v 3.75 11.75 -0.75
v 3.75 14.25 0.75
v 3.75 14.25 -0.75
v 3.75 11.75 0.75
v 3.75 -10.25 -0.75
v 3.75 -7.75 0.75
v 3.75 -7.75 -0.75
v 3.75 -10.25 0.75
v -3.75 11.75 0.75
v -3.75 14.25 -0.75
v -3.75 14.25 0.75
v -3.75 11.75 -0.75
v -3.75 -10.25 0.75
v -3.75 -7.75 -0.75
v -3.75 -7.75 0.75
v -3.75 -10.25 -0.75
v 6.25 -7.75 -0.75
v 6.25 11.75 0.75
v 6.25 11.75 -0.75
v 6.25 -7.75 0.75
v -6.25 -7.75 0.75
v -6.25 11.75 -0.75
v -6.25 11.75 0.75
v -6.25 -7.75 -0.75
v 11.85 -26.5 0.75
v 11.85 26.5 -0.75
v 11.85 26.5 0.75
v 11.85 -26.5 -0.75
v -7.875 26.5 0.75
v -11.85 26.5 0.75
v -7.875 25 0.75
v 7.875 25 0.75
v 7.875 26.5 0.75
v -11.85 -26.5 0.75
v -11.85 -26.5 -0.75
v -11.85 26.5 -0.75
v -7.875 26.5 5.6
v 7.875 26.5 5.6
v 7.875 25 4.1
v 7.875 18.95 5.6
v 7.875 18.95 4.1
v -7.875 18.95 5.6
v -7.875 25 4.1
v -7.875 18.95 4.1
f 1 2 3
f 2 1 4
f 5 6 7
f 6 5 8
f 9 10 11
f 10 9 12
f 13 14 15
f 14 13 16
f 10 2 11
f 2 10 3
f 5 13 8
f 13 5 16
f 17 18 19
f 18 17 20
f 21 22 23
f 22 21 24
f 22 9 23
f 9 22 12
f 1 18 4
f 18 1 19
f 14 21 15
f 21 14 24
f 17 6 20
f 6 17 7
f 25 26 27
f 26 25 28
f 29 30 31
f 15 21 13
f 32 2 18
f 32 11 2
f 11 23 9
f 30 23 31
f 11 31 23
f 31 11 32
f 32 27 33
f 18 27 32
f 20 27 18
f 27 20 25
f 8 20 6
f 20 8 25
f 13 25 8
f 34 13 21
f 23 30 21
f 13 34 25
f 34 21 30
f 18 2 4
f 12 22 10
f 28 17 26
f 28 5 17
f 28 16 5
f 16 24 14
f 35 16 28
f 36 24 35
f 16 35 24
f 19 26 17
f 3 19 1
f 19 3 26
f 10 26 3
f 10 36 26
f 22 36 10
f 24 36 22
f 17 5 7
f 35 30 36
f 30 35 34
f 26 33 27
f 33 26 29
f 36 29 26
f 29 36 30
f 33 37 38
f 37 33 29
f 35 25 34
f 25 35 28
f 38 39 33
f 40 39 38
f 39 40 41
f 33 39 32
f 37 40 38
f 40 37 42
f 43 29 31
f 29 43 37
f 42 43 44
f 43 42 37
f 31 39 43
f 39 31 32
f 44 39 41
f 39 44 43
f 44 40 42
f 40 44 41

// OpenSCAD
// pc6001 rear shell for power entry connector
// about 5.5mm on either side of the qualitek entry

THICKNESS = 1.5; // 1.2 measured, just being safe
FUDGE = 0.5;

module iec_cutout () {
    // Qualitek 770W-X2/13 snap-in
    union() {
        // 24.5 x 7.5 inner cutout
        cube([7.5, 24.5, THICKNESS * 2], center=true);
        // 19.5 x 12.5 outer cutout
        cube([12.5, 19.5, THICKNESS * 2], center=true);
    }
}

module back_plate () {
    // The main vertical plate
    cube([23.7, 53, THICKNESS], center=true);
}

module mounting_lip() {
    union() {
        // The upright that connects it to the lip
        cube([15.75, THICKNESS, 5.6], center=true);
        // The lip
        translate([0, -6.8/2, (5.6 - THICKNESS)/2]) {
            cube([15.75, 6.8, THICKNESS], center=true);
        }
    }
}

//mounting_lip();

union() {
    difference() {
        back_plate();
        // move 2mm up
        translate([0, 2, 0]) {
            iec_cutout();
        }
    }
    
    // Move to the top, make top lip
    translate([0, (53 - THICKNESS)/2, 5.6/2]) {
        mounting_lip();
    }
}
